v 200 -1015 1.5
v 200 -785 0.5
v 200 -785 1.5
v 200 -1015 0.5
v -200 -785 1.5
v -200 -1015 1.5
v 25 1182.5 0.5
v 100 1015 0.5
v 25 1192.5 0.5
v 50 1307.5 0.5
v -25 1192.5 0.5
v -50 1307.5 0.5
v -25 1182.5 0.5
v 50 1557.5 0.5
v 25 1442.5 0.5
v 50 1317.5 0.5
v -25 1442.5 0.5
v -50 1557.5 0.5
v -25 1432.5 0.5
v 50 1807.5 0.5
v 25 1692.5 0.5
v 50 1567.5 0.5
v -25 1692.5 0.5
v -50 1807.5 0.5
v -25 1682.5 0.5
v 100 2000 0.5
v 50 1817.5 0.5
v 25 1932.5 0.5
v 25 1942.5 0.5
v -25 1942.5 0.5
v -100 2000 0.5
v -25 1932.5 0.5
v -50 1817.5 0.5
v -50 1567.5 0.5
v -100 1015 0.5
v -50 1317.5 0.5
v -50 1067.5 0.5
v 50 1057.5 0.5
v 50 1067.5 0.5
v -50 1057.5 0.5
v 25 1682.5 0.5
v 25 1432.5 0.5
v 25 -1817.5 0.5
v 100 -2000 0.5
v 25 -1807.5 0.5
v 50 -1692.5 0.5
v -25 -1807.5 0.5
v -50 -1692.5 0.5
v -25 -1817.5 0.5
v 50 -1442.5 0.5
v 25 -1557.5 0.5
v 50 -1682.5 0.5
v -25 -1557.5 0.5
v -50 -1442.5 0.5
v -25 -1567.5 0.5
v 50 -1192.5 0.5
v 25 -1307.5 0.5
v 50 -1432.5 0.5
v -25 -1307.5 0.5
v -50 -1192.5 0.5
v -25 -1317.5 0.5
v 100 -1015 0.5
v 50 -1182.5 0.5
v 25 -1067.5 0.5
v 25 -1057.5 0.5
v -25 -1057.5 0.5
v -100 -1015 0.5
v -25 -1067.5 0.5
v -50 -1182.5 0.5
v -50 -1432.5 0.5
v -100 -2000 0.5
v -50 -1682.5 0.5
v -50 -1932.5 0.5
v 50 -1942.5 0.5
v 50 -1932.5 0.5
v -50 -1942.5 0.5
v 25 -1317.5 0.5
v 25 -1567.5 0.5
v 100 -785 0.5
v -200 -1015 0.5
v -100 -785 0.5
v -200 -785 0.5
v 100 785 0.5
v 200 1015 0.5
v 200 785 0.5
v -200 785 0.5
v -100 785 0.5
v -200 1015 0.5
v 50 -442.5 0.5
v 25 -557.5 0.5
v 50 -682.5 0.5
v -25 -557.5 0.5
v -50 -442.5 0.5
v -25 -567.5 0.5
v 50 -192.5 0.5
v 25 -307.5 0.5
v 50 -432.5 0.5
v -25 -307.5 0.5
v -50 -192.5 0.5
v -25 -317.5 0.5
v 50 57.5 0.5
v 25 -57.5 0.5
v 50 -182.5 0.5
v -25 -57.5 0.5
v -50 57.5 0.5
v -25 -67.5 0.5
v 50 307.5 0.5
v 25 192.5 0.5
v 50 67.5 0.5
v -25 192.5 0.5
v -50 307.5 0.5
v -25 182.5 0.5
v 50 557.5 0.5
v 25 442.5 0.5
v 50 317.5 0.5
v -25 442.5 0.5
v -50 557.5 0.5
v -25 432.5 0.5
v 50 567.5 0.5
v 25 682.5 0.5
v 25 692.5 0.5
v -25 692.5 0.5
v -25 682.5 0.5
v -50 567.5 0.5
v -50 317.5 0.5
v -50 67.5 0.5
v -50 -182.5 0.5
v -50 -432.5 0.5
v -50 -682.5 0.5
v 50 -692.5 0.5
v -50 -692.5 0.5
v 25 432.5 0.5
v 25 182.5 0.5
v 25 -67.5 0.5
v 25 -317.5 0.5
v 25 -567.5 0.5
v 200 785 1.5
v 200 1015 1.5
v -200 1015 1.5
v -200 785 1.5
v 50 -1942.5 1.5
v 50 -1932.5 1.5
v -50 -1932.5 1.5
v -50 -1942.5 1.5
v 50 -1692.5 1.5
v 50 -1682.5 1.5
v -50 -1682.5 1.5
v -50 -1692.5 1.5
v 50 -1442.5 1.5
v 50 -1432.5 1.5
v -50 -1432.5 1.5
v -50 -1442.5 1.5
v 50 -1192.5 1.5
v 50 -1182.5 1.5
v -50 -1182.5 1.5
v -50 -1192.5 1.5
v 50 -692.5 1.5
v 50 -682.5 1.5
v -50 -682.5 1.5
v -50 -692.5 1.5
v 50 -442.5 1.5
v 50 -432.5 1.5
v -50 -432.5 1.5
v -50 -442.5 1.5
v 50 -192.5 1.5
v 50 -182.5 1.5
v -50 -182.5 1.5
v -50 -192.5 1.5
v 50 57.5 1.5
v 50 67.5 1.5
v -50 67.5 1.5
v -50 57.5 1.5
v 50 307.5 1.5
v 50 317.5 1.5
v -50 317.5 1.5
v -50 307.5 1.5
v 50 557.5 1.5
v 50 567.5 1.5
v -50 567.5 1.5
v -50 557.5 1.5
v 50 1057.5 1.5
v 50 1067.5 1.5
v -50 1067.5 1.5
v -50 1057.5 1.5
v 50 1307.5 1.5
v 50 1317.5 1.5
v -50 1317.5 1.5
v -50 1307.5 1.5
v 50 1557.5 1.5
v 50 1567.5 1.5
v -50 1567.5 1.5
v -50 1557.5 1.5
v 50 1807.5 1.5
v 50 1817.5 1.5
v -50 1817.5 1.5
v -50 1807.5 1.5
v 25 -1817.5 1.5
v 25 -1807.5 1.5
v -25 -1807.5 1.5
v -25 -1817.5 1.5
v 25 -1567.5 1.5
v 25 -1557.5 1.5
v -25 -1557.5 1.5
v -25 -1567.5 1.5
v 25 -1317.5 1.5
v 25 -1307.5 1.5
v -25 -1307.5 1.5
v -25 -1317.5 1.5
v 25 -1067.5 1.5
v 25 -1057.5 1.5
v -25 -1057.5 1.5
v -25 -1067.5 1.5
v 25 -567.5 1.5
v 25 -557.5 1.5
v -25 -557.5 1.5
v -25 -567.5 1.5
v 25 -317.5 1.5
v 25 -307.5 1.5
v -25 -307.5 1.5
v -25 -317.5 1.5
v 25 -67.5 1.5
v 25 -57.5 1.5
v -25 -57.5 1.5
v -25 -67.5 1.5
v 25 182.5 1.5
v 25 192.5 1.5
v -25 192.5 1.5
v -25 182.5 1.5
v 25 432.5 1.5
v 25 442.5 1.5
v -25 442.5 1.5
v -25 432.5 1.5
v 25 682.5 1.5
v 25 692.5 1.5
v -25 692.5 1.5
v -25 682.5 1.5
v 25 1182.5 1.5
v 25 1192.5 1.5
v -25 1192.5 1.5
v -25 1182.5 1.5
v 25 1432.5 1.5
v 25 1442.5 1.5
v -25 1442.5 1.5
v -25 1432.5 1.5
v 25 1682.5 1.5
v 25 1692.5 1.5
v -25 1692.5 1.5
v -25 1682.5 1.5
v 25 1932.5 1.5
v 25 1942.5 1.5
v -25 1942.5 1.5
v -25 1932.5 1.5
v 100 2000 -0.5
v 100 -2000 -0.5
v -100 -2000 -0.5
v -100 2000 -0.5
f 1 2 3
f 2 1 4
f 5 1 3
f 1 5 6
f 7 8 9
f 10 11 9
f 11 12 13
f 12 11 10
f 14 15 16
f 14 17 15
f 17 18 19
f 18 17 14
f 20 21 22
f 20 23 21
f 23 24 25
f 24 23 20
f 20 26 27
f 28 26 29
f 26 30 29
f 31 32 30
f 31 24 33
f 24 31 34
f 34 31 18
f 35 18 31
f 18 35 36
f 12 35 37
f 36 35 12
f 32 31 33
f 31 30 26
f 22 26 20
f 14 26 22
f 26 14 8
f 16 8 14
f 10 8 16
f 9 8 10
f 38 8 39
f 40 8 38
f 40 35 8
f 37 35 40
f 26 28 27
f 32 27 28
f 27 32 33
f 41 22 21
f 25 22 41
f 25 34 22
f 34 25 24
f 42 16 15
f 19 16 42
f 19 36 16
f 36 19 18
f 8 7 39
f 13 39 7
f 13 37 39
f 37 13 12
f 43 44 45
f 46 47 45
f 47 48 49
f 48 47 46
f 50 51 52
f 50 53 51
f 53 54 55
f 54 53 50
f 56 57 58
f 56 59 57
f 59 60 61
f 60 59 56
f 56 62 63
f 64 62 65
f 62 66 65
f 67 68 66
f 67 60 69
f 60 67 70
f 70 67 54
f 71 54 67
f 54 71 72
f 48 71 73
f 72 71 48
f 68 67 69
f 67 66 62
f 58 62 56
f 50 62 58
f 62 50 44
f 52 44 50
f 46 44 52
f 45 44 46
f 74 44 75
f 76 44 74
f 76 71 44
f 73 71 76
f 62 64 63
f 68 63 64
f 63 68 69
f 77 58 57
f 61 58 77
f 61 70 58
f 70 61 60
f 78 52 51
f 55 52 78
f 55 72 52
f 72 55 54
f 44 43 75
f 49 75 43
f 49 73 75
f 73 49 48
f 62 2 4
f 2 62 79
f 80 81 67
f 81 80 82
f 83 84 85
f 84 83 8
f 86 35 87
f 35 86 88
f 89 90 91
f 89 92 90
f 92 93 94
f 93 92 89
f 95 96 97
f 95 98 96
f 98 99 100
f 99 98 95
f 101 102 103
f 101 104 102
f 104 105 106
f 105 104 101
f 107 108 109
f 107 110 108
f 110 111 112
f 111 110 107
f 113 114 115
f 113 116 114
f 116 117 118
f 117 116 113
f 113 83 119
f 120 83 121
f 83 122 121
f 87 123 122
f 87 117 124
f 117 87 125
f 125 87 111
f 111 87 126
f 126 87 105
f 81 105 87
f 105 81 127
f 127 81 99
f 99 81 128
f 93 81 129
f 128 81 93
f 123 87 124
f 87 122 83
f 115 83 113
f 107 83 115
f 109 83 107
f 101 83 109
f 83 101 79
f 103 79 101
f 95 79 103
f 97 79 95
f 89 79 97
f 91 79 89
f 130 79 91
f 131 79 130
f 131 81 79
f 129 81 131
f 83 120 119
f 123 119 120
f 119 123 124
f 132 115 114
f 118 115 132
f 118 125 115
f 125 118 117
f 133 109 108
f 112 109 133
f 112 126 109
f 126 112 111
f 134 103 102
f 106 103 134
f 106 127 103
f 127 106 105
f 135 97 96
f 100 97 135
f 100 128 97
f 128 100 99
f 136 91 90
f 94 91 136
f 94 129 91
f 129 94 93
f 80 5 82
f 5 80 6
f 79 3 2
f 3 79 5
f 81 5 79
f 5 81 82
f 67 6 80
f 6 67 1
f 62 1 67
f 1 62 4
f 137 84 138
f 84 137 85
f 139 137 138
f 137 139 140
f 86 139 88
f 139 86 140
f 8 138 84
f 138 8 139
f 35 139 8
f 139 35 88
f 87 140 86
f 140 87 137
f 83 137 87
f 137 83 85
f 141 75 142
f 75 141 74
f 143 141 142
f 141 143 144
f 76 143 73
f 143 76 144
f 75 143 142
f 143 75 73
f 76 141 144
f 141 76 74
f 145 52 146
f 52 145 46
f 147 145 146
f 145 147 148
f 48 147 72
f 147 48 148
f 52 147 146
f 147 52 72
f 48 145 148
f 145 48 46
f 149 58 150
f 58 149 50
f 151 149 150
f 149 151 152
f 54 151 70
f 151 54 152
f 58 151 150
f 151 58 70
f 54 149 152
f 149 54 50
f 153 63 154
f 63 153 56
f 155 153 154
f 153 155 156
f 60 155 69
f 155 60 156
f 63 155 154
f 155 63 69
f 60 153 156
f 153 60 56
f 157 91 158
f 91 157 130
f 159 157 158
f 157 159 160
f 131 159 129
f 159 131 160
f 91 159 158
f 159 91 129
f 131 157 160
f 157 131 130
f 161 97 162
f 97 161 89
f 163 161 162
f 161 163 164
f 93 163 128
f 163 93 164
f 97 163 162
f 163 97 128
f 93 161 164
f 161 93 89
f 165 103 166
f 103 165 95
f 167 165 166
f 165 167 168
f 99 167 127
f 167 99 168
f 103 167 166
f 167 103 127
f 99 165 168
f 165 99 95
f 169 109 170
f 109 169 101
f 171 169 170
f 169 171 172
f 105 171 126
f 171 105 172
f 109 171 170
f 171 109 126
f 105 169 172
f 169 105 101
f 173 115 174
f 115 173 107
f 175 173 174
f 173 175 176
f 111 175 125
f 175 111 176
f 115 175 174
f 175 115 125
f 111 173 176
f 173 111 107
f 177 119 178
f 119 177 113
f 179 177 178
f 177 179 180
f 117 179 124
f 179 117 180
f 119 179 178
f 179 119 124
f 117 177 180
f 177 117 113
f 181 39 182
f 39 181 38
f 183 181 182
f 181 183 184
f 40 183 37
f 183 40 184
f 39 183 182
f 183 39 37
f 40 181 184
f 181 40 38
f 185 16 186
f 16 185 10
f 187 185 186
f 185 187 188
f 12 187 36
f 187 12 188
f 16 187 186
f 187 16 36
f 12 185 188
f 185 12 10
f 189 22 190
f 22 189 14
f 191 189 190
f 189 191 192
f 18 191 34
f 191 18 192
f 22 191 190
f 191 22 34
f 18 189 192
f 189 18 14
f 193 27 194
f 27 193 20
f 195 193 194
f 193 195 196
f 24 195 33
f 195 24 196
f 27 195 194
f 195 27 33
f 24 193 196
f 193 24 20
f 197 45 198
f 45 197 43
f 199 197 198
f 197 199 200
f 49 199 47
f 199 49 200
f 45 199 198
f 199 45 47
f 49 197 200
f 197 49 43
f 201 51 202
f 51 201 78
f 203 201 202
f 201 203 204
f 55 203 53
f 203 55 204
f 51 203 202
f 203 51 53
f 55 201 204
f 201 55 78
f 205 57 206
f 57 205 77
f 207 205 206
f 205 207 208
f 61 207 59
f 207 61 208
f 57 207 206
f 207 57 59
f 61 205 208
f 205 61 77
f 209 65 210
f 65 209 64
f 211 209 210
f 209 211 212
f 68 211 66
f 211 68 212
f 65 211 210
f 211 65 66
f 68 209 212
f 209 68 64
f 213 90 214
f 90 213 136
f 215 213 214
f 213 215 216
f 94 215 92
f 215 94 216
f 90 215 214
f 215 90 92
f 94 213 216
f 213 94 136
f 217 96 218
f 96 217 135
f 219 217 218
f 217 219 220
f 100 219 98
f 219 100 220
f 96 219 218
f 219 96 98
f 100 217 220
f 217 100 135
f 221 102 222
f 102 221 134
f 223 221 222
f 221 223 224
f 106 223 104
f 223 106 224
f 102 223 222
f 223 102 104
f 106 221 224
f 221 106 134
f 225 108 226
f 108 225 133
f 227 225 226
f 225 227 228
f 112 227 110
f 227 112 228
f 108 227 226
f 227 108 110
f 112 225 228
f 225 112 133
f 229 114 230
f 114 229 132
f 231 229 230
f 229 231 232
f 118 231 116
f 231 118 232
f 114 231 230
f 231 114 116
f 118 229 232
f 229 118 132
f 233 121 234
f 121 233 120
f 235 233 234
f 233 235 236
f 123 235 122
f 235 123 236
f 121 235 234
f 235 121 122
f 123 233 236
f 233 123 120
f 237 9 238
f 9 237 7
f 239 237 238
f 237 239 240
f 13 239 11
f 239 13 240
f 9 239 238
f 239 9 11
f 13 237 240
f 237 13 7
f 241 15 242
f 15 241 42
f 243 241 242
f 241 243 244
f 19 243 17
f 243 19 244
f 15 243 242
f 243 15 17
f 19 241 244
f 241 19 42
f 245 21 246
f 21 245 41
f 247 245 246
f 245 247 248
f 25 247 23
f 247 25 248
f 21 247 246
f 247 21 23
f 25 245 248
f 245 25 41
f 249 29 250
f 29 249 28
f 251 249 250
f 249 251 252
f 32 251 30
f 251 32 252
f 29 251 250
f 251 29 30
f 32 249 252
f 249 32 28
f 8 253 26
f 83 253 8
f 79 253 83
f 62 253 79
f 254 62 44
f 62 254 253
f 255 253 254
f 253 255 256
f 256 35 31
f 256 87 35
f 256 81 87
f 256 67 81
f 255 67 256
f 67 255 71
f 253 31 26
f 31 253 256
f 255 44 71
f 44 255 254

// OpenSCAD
$fs=$fs/4;
$fa=$fa/4;


cube([200,4000,1], center = true);


voie = true;
bineuse12 = true;

rayon125 = 32;
rayon25 = 16;
rayon75 = 0;
rayon80 = 0;
rayon60 = 0;

//cube([100,2440,30], center=true);

ceuilleur50 = 0;
ceuilleur60 = 0;




if(voie){
    for(i=[-1,1]){
        translate([0,i*900,1]) color("green") cube([400,230,1], center = true);
    }
}

if(rayon25){
    for(i=[1:rayon25]){
        translate([0,(i-(rayon25+1+0.5)/2)*250,1]) color("blue") cube([100,10,1], center = true);
    }
}

if(rayon125){
    for(i=[1:rayon125]){
        translate([0,(i-(rayon125+1)/2)*125,1]) color("blue") cube([50,10,1], center = true);
    }
}
